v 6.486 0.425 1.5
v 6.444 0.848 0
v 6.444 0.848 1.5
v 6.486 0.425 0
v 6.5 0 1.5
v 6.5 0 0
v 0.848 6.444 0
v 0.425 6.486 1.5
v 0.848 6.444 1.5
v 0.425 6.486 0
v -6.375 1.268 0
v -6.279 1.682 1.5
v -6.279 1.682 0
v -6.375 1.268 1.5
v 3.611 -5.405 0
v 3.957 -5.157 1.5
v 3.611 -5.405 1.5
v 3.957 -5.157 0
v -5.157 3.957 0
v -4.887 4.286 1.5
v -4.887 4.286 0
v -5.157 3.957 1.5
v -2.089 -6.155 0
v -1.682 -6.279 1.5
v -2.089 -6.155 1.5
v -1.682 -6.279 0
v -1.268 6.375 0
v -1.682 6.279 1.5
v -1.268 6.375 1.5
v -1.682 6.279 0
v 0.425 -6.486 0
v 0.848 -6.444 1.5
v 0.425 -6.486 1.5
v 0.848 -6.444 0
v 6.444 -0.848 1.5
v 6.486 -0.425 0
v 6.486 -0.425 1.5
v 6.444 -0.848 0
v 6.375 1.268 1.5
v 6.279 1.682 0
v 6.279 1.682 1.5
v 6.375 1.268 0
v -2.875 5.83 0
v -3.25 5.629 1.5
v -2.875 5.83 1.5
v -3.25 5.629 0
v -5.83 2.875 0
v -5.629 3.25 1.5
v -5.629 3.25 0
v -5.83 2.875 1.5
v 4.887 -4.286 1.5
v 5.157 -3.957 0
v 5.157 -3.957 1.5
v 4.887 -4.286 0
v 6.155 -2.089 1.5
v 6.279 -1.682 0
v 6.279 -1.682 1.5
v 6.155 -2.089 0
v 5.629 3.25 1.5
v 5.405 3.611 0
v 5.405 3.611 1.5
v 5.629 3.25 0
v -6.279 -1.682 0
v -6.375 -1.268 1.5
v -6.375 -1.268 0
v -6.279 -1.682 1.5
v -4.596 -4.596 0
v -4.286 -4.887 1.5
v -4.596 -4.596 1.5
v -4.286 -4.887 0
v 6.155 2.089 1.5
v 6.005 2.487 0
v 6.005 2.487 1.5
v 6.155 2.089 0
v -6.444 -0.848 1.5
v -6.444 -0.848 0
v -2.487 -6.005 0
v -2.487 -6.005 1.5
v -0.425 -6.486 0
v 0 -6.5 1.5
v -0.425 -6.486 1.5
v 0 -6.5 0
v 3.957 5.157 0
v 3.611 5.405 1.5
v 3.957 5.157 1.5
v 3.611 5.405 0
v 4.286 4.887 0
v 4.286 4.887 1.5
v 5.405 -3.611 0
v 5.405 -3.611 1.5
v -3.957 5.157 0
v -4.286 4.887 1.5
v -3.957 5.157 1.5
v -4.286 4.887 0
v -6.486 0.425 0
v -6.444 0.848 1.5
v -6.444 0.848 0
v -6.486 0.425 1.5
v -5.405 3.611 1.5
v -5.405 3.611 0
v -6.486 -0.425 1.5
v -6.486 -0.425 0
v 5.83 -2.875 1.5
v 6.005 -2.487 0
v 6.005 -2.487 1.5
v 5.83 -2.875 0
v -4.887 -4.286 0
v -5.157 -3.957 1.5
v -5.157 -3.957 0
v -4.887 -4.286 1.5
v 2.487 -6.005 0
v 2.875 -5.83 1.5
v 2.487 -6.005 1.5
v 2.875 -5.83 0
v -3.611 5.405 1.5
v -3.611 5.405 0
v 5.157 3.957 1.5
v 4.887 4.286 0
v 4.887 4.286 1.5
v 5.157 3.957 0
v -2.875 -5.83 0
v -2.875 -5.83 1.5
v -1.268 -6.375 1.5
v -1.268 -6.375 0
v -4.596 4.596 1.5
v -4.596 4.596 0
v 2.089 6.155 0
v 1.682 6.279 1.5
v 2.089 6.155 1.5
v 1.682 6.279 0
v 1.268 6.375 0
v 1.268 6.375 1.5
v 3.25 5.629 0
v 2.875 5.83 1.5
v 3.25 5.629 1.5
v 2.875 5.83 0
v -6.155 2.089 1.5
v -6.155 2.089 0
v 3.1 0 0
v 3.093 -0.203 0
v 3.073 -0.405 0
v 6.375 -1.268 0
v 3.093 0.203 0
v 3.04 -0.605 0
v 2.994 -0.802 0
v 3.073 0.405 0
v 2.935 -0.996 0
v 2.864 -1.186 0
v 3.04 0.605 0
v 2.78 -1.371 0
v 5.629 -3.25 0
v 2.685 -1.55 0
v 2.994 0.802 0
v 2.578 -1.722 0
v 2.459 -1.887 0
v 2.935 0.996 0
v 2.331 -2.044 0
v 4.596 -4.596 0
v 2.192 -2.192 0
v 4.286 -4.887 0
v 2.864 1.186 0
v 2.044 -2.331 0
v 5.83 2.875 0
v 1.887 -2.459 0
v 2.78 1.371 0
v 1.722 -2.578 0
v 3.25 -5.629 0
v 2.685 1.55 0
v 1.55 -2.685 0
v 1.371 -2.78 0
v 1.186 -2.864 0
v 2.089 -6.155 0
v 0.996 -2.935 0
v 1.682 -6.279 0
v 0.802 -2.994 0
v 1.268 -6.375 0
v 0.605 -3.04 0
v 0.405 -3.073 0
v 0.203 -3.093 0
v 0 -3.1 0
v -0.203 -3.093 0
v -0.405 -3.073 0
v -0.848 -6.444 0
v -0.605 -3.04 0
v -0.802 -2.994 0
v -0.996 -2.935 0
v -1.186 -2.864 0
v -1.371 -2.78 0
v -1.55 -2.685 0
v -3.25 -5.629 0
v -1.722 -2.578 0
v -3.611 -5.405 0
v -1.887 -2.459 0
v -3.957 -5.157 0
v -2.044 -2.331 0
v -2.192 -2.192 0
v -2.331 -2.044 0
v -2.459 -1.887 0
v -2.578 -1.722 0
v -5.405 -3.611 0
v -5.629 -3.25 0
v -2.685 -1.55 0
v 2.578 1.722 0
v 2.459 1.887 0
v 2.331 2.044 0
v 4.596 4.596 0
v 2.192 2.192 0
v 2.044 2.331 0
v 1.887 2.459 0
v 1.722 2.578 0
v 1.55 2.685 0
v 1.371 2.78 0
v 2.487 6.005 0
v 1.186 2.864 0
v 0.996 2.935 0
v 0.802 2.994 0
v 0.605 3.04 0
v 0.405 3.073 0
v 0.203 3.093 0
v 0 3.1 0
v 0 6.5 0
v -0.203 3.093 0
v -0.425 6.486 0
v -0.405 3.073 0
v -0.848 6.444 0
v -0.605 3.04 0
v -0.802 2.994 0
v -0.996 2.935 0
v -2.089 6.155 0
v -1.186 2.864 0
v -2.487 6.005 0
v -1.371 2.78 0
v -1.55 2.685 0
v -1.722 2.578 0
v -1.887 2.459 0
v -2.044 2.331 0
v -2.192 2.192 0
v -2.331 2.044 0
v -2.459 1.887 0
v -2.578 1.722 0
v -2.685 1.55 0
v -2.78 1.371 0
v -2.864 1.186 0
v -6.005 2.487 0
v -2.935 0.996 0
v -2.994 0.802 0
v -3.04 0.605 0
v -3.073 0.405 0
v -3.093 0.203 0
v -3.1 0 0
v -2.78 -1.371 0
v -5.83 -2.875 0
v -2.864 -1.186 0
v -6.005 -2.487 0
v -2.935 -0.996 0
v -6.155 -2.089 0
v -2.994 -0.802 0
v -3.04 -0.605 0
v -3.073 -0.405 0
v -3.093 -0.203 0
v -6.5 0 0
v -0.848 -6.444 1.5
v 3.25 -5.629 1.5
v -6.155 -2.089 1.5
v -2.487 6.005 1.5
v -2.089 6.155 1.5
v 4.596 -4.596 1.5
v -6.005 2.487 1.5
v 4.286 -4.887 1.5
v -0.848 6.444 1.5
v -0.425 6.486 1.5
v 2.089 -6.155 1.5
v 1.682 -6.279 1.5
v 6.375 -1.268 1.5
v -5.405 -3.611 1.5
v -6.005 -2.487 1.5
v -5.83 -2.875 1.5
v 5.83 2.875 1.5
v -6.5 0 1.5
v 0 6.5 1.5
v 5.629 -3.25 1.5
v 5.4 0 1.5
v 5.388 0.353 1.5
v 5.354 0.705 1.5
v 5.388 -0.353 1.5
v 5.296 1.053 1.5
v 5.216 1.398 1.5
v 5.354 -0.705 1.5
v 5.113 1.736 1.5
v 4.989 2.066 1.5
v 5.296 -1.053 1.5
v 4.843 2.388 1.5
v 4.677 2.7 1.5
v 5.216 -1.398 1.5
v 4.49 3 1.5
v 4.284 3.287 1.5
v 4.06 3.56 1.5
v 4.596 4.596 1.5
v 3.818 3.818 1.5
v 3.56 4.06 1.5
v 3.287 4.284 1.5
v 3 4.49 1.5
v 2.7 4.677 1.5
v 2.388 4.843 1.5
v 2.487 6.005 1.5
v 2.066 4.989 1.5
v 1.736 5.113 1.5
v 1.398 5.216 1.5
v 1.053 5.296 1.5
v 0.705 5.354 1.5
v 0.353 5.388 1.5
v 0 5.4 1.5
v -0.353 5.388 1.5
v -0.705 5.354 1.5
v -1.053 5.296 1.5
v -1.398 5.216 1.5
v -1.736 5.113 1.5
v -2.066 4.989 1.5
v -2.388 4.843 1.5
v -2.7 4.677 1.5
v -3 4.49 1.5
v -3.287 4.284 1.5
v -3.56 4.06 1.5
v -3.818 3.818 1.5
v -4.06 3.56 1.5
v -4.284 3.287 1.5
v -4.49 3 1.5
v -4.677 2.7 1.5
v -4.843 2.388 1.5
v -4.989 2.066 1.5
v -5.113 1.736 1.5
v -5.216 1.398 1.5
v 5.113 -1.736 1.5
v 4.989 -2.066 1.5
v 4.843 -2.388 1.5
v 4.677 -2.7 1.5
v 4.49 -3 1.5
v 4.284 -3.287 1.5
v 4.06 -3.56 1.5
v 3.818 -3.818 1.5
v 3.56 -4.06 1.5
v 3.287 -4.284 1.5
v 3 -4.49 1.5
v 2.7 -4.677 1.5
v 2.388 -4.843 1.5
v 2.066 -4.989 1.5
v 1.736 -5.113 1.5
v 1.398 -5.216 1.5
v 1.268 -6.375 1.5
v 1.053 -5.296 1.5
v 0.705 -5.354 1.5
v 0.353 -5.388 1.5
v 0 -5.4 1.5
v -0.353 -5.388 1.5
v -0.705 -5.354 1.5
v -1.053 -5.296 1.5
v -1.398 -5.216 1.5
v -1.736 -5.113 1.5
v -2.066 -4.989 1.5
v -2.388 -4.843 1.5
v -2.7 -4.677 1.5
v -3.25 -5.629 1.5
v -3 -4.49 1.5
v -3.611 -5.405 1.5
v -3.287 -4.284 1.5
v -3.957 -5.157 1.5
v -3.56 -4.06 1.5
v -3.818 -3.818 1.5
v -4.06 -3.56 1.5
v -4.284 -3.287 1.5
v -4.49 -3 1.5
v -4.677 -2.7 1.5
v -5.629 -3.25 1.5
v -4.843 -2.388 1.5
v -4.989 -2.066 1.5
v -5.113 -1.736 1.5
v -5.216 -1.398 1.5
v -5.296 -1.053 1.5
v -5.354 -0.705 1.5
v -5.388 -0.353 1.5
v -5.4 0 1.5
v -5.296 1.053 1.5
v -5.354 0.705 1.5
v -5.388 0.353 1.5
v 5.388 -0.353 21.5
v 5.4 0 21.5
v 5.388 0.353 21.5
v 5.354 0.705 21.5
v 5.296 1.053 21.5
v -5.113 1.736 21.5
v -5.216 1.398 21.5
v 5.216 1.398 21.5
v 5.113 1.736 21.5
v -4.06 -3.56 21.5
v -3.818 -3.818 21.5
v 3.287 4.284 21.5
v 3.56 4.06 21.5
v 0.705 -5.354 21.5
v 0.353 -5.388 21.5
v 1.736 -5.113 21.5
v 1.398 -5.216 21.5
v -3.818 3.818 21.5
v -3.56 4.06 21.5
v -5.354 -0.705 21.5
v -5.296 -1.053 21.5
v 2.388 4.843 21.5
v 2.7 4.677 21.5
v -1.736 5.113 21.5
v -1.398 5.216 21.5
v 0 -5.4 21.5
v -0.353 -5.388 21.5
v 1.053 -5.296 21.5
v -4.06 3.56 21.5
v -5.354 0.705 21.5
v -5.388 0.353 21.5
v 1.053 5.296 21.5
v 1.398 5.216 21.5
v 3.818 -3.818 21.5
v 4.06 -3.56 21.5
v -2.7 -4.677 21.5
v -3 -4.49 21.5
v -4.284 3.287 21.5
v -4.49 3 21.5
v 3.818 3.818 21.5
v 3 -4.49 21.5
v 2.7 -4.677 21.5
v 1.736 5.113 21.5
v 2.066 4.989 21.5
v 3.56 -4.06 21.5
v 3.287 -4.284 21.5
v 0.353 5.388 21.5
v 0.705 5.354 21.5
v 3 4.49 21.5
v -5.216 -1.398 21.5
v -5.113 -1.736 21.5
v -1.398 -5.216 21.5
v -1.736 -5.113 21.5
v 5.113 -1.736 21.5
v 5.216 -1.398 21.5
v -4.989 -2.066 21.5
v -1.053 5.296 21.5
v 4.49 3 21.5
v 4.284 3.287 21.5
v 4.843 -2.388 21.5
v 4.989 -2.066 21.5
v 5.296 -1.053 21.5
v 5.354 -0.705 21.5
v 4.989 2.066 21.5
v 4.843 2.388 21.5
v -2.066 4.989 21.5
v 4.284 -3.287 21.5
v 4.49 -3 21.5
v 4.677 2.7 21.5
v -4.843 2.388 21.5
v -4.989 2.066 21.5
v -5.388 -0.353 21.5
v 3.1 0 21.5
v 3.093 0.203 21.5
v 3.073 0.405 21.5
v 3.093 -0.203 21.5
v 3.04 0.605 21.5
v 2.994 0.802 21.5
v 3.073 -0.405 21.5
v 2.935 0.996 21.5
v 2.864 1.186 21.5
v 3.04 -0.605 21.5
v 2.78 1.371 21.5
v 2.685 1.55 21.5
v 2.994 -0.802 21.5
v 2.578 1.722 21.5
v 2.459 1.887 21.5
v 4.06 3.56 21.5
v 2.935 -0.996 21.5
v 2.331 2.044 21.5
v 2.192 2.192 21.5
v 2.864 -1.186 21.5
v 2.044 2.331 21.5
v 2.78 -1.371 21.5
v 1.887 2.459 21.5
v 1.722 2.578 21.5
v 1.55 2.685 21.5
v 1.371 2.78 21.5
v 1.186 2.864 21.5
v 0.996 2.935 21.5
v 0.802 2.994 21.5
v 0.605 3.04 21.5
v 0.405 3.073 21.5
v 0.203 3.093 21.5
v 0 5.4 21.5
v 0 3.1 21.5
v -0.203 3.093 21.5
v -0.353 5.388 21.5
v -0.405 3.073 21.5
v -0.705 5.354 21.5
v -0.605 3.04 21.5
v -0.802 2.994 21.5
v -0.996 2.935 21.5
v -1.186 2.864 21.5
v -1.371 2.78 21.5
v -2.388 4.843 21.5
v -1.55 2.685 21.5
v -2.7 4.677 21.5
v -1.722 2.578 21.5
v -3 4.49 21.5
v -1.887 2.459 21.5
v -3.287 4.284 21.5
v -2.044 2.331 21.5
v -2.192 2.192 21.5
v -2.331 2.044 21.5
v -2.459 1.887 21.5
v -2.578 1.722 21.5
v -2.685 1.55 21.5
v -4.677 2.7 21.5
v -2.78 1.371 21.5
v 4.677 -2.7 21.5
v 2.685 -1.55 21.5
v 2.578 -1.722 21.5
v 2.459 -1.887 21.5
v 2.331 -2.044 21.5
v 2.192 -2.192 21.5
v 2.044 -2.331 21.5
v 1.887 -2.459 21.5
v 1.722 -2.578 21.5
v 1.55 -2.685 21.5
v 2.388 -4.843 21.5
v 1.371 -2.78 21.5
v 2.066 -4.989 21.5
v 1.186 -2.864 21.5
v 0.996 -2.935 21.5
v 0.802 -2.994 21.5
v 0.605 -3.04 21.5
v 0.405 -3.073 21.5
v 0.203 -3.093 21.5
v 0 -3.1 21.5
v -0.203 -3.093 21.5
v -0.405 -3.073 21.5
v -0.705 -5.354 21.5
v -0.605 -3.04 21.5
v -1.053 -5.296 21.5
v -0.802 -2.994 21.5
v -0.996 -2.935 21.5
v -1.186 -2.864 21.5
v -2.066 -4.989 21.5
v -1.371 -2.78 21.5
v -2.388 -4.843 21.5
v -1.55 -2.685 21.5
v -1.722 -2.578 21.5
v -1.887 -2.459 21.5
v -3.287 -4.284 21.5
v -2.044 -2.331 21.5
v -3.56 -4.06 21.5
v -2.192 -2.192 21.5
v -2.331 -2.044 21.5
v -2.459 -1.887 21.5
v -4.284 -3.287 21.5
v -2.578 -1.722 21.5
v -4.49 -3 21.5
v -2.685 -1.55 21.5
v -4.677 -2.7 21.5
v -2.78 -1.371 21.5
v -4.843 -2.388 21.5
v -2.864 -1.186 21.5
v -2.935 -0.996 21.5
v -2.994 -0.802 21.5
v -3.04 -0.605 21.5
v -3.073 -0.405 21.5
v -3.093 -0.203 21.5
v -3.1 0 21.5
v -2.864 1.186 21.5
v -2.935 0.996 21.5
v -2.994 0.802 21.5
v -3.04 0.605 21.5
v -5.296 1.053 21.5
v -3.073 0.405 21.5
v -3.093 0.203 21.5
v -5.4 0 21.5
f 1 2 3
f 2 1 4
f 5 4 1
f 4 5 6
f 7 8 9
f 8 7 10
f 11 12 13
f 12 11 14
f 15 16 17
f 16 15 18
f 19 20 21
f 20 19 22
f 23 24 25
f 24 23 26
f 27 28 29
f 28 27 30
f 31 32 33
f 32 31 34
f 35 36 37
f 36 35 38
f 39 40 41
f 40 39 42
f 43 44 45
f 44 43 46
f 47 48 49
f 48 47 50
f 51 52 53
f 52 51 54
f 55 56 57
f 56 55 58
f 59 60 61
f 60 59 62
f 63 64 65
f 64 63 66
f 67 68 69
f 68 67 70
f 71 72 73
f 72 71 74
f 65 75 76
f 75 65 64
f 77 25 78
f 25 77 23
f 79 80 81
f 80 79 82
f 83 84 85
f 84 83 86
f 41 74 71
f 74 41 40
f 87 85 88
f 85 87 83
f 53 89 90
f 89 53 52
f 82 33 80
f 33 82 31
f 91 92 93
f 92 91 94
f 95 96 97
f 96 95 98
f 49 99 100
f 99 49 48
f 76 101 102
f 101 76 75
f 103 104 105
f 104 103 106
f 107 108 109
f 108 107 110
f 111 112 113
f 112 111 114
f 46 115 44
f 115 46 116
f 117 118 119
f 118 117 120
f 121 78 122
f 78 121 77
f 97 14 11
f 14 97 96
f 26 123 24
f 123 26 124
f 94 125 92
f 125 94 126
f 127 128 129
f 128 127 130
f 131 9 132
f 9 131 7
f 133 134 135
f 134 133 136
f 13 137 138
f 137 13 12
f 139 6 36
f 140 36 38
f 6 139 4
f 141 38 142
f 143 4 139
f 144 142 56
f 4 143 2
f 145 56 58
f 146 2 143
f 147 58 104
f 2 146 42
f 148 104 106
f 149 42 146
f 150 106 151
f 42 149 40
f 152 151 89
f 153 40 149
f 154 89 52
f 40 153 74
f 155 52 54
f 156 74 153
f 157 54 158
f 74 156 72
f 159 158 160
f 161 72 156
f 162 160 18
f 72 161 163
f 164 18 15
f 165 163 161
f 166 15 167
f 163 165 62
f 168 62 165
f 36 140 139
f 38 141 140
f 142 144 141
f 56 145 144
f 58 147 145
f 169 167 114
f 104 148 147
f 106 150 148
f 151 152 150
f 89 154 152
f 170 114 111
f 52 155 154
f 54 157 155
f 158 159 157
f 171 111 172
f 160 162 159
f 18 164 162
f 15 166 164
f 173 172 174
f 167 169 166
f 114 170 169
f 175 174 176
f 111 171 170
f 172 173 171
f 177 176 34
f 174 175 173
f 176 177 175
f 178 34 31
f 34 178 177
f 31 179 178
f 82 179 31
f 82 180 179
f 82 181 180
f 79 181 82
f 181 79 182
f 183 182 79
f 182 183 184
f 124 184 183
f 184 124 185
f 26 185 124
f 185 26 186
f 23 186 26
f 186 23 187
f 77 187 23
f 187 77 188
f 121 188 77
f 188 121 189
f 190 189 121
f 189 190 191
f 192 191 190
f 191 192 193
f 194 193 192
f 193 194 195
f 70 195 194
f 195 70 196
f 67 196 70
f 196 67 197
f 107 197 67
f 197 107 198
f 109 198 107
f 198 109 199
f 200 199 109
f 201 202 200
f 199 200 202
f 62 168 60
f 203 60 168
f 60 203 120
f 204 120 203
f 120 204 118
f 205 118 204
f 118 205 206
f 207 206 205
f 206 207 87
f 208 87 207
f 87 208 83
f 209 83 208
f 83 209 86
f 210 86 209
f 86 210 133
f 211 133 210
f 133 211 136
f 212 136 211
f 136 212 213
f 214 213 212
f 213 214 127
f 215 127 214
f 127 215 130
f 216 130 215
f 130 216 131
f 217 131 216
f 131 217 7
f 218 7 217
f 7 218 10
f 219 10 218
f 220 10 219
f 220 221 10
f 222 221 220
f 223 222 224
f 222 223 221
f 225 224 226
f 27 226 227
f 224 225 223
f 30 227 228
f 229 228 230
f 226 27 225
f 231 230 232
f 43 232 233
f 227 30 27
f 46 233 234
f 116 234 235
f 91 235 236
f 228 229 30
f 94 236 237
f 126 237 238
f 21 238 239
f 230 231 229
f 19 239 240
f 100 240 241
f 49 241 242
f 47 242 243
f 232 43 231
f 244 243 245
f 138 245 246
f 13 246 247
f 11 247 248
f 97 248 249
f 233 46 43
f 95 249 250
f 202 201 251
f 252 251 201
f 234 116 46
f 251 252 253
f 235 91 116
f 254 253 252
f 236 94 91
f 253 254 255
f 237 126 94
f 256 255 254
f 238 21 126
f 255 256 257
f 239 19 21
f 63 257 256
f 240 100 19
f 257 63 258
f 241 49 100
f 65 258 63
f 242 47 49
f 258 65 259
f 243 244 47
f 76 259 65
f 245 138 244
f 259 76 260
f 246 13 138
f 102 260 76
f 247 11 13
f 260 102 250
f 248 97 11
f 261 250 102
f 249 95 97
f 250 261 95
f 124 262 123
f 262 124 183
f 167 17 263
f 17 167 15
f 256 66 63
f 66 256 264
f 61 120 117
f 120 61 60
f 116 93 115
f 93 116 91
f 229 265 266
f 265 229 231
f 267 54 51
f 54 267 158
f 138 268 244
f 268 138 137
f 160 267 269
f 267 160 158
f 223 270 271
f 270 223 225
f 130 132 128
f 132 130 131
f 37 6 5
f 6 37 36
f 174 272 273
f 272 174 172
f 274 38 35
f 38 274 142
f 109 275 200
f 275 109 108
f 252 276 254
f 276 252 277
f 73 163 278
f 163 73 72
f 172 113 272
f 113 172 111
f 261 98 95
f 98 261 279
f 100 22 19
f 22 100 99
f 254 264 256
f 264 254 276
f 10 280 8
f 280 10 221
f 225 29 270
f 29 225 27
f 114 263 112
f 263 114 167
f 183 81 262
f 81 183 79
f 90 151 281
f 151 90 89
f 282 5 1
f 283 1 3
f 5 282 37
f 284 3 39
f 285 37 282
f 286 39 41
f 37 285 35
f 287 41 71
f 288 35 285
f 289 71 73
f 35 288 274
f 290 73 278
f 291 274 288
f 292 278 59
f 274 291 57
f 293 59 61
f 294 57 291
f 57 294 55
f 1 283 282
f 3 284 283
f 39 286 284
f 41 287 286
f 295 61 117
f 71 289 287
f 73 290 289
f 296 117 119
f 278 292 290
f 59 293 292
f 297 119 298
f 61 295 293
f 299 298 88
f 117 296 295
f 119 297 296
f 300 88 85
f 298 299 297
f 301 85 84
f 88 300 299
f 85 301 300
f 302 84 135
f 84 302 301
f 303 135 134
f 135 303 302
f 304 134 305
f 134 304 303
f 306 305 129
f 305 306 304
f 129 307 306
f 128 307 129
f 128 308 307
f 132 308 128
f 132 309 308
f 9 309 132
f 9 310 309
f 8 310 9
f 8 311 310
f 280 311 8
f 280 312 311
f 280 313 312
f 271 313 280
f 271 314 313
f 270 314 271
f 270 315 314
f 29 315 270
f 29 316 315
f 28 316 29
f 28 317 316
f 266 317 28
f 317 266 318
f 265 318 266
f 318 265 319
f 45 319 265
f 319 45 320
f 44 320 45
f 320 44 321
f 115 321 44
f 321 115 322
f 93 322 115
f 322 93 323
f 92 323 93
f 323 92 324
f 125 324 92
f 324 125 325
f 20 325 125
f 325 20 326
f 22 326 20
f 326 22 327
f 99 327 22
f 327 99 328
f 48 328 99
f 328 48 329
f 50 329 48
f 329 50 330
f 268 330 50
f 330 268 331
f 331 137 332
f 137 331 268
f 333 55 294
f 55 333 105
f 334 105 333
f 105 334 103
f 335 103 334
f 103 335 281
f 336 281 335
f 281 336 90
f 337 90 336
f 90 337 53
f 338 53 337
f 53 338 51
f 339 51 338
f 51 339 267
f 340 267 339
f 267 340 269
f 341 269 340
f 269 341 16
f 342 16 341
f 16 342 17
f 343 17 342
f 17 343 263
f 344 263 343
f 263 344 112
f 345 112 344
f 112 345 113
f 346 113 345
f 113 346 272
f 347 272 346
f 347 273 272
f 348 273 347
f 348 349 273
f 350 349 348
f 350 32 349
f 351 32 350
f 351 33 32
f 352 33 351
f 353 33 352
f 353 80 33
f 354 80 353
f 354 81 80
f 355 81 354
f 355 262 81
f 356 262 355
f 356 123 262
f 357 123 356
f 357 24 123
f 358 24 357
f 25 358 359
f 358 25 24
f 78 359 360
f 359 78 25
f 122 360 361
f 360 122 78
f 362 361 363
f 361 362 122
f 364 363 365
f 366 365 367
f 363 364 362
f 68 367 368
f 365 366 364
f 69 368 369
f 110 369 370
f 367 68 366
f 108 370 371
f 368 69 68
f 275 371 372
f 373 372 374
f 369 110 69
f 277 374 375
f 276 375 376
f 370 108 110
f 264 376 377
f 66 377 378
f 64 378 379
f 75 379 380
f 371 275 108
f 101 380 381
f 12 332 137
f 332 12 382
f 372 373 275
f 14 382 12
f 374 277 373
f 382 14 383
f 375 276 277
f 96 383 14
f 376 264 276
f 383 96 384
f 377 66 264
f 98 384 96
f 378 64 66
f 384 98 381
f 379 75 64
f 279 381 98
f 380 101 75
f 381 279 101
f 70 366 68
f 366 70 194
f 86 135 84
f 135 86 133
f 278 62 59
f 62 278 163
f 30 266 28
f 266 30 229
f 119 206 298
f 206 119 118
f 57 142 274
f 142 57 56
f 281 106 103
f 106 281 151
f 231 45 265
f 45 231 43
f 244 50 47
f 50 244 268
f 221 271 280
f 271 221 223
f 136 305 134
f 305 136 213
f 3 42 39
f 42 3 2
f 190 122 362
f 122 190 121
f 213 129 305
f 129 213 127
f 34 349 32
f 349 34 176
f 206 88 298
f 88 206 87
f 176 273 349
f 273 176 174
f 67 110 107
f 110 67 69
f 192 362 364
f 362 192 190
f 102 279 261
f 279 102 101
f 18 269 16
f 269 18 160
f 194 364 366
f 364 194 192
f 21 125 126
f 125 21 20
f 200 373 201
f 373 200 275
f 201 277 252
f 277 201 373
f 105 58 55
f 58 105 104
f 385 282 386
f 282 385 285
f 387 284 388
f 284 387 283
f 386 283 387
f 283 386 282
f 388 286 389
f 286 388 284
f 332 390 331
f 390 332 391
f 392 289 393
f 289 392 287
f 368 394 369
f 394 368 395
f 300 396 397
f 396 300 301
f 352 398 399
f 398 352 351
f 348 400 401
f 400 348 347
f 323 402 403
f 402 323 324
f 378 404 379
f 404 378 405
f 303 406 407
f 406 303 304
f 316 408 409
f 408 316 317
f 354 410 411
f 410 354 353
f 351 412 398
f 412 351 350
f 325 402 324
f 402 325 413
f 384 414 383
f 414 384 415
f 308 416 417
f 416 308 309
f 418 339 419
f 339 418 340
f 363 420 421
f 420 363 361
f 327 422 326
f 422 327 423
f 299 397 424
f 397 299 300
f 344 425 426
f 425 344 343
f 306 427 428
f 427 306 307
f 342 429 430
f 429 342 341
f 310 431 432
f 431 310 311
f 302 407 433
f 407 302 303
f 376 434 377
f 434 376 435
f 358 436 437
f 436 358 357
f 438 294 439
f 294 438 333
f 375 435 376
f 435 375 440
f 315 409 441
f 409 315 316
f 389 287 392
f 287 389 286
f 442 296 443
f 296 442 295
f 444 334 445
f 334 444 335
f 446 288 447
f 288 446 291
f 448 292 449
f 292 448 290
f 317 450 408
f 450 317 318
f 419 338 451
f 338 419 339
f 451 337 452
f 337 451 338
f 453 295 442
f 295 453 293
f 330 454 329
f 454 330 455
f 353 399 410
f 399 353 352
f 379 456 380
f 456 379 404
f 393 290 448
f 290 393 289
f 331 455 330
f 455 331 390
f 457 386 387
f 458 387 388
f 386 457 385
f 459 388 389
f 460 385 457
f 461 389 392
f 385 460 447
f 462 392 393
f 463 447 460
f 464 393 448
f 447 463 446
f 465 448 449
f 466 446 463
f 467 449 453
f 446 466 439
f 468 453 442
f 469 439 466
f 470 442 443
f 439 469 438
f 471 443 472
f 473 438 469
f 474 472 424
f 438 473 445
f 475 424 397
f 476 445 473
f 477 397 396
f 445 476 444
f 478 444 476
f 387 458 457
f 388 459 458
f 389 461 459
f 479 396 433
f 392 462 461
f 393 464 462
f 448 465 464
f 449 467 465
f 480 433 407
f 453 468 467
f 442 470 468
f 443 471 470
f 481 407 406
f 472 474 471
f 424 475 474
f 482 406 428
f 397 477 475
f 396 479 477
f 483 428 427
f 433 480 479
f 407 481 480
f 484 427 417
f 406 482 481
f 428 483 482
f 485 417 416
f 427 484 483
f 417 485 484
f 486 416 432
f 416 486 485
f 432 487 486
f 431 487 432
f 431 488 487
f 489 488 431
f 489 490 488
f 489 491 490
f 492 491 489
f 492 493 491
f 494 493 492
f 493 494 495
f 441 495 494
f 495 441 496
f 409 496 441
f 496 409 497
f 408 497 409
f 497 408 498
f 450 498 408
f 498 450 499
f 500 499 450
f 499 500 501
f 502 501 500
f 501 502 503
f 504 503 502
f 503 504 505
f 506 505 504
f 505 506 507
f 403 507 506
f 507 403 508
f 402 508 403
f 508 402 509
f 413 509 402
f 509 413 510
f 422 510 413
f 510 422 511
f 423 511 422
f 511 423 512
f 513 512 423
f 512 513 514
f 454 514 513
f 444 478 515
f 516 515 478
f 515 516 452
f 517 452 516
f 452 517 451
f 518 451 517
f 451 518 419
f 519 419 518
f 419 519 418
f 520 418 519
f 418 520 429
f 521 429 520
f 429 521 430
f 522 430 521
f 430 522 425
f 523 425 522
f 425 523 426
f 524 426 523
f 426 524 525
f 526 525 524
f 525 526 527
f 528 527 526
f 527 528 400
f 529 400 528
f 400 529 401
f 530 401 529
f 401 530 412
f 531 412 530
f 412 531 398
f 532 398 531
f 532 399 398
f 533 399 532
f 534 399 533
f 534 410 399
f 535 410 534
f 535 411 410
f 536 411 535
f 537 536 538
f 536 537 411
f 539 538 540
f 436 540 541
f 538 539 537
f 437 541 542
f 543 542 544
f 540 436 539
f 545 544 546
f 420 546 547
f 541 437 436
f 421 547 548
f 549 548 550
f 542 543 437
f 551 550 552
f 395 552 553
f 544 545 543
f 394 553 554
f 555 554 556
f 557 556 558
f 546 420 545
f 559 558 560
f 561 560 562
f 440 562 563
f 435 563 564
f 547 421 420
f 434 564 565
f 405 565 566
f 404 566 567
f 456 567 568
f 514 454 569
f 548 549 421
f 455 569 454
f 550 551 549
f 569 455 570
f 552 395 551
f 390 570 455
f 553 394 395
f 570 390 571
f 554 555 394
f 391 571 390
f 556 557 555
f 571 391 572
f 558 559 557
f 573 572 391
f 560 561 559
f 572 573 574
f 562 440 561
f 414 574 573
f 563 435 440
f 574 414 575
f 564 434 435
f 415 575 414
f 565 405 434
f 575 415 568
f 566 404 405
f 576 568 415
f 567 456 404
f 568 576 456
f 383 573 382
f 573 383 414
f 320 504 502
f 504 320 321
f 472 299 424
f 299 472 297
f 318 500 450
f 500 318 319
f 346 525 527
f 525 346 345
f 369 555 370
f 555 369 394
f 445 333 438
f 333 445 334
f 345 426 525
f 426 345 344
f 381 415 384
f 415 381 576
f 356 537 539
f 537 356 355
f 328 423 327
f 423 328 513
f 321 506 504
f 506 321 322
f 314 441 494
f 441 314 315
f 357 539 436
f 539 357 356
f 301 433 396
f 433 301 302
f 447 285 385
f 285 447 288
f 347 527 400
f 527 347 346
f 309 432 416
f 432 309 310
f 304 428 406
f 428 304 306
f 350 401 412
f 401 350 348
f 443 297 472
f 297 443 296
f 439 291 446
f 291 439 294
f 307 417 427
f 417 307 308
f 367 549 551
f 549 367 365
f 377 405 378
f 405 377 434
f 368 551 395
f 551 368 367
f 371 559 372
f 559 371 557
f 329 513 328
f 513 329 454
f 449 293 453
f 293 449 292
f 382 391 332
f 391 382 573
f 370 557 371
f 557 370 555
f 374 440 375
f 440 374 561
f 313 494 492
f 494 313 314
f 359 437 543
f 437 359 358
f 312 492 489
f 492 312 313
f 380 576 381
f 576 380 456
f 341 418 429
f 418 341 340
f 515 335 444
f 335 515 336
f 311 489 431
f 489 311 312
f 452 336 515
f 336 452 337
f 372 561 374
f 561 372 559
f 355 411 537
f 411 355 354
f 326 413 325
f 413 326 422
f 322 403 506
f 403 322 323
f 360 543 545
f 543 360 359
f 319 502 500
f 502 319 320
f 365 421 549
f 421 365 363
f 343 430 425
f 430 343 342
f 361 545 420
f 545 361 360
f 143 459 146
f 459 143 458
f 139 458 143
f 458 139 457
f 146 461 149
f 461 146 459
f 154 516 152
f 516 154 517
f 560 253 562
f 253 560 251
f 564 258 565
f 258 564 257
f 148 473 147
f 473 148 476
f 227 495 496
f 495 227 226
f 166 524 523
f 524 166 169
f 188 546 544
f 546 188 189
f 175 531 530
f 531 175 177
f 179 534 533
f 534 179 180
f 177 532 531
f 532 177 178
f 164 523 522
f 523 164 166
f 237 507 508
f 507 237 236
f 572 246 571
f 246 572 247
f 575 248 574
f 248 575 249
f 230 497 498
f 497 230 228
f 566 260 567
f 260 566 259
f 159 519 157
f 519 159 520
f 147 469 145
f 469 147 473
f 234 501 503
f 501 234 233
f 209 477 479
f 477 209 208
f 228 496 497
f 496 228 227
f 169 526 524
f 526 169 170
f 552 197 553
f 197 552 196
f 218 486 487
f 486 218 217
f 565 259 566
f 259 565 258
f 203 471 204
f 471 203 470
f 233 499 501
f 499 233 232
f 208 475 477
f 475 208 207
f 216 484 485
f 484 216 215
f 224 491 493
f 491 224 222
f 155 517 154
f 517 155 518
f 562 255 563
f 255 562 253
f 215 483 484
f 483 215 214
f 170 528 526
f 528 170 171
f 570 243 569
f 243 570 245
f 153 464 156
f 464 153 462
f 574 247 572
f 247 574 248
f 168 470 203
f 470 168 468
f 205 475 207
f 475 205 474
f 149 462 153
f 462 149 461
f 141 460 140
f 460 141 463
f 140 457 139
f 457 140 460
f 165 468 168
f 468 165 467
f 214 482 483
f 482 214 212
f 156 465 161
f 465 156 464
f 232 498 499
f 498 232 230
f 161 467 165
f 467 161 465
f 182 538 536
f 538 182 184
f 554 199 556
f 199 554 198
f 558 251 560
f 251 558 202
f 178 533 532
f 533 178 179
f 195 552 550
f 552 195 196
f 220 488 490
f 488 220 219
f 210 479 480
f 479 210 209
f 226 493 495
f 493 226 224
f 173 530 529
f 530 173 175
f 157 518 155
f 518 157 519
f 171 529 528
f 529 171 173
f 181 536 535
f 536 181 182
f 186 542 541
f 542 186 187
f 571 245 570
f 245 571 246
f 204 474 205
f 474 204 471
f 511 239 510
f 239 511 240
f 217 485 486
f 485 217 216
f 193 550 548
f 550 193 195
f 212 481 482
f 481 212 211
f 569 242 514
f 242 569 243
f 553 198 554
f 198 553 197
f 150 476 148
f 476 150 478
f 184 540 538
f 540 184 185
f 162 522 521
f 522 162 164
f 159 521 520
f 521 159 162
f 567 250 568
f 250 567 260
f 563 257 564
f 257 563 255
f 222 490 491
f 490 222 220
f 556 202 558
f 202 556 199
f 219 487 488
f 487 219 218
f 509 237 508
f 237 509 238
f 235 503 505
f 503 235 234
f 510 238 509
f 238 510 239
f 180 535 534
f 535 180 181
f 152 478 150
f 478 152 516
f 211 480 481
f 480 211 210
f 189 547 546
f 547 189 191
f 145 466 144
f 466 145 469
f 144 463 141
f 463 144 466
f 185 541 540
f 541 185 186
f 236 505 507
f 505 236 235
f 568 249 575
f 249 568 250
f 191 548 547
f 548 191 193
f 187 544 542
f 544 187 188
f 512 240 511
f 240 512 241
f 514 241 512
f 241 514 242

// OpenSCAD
// PCR tube adapter sleeve (printed upside down, collar on bed)
$fn = 96;

collar_d      = 13;    // collar outer diameter
collar_h      = 1.5;   // collar thickness (z = 0 to 1.5)
body_d        = 10.8;  // sleeve body outer diameter
total_h       = 21.5;  // overall height
bore_d        = 6.2;   // through bore diameter
cut_margin    = 0.5;   // extra length of cutting cylinder past each face

difference() {
    union() {
        // collar on the bed
        cylinder(d = collar_d, h = collar_h);
        // sleeve body rising from the collar
        cylinder(d = body_d, h = total_h);
    }
    // straight through bore, open at both ends
    translate([0, 0, -cut_margin])
        cylinder(d = bore_d, h = total_h + 2 * cut_margin);
}
